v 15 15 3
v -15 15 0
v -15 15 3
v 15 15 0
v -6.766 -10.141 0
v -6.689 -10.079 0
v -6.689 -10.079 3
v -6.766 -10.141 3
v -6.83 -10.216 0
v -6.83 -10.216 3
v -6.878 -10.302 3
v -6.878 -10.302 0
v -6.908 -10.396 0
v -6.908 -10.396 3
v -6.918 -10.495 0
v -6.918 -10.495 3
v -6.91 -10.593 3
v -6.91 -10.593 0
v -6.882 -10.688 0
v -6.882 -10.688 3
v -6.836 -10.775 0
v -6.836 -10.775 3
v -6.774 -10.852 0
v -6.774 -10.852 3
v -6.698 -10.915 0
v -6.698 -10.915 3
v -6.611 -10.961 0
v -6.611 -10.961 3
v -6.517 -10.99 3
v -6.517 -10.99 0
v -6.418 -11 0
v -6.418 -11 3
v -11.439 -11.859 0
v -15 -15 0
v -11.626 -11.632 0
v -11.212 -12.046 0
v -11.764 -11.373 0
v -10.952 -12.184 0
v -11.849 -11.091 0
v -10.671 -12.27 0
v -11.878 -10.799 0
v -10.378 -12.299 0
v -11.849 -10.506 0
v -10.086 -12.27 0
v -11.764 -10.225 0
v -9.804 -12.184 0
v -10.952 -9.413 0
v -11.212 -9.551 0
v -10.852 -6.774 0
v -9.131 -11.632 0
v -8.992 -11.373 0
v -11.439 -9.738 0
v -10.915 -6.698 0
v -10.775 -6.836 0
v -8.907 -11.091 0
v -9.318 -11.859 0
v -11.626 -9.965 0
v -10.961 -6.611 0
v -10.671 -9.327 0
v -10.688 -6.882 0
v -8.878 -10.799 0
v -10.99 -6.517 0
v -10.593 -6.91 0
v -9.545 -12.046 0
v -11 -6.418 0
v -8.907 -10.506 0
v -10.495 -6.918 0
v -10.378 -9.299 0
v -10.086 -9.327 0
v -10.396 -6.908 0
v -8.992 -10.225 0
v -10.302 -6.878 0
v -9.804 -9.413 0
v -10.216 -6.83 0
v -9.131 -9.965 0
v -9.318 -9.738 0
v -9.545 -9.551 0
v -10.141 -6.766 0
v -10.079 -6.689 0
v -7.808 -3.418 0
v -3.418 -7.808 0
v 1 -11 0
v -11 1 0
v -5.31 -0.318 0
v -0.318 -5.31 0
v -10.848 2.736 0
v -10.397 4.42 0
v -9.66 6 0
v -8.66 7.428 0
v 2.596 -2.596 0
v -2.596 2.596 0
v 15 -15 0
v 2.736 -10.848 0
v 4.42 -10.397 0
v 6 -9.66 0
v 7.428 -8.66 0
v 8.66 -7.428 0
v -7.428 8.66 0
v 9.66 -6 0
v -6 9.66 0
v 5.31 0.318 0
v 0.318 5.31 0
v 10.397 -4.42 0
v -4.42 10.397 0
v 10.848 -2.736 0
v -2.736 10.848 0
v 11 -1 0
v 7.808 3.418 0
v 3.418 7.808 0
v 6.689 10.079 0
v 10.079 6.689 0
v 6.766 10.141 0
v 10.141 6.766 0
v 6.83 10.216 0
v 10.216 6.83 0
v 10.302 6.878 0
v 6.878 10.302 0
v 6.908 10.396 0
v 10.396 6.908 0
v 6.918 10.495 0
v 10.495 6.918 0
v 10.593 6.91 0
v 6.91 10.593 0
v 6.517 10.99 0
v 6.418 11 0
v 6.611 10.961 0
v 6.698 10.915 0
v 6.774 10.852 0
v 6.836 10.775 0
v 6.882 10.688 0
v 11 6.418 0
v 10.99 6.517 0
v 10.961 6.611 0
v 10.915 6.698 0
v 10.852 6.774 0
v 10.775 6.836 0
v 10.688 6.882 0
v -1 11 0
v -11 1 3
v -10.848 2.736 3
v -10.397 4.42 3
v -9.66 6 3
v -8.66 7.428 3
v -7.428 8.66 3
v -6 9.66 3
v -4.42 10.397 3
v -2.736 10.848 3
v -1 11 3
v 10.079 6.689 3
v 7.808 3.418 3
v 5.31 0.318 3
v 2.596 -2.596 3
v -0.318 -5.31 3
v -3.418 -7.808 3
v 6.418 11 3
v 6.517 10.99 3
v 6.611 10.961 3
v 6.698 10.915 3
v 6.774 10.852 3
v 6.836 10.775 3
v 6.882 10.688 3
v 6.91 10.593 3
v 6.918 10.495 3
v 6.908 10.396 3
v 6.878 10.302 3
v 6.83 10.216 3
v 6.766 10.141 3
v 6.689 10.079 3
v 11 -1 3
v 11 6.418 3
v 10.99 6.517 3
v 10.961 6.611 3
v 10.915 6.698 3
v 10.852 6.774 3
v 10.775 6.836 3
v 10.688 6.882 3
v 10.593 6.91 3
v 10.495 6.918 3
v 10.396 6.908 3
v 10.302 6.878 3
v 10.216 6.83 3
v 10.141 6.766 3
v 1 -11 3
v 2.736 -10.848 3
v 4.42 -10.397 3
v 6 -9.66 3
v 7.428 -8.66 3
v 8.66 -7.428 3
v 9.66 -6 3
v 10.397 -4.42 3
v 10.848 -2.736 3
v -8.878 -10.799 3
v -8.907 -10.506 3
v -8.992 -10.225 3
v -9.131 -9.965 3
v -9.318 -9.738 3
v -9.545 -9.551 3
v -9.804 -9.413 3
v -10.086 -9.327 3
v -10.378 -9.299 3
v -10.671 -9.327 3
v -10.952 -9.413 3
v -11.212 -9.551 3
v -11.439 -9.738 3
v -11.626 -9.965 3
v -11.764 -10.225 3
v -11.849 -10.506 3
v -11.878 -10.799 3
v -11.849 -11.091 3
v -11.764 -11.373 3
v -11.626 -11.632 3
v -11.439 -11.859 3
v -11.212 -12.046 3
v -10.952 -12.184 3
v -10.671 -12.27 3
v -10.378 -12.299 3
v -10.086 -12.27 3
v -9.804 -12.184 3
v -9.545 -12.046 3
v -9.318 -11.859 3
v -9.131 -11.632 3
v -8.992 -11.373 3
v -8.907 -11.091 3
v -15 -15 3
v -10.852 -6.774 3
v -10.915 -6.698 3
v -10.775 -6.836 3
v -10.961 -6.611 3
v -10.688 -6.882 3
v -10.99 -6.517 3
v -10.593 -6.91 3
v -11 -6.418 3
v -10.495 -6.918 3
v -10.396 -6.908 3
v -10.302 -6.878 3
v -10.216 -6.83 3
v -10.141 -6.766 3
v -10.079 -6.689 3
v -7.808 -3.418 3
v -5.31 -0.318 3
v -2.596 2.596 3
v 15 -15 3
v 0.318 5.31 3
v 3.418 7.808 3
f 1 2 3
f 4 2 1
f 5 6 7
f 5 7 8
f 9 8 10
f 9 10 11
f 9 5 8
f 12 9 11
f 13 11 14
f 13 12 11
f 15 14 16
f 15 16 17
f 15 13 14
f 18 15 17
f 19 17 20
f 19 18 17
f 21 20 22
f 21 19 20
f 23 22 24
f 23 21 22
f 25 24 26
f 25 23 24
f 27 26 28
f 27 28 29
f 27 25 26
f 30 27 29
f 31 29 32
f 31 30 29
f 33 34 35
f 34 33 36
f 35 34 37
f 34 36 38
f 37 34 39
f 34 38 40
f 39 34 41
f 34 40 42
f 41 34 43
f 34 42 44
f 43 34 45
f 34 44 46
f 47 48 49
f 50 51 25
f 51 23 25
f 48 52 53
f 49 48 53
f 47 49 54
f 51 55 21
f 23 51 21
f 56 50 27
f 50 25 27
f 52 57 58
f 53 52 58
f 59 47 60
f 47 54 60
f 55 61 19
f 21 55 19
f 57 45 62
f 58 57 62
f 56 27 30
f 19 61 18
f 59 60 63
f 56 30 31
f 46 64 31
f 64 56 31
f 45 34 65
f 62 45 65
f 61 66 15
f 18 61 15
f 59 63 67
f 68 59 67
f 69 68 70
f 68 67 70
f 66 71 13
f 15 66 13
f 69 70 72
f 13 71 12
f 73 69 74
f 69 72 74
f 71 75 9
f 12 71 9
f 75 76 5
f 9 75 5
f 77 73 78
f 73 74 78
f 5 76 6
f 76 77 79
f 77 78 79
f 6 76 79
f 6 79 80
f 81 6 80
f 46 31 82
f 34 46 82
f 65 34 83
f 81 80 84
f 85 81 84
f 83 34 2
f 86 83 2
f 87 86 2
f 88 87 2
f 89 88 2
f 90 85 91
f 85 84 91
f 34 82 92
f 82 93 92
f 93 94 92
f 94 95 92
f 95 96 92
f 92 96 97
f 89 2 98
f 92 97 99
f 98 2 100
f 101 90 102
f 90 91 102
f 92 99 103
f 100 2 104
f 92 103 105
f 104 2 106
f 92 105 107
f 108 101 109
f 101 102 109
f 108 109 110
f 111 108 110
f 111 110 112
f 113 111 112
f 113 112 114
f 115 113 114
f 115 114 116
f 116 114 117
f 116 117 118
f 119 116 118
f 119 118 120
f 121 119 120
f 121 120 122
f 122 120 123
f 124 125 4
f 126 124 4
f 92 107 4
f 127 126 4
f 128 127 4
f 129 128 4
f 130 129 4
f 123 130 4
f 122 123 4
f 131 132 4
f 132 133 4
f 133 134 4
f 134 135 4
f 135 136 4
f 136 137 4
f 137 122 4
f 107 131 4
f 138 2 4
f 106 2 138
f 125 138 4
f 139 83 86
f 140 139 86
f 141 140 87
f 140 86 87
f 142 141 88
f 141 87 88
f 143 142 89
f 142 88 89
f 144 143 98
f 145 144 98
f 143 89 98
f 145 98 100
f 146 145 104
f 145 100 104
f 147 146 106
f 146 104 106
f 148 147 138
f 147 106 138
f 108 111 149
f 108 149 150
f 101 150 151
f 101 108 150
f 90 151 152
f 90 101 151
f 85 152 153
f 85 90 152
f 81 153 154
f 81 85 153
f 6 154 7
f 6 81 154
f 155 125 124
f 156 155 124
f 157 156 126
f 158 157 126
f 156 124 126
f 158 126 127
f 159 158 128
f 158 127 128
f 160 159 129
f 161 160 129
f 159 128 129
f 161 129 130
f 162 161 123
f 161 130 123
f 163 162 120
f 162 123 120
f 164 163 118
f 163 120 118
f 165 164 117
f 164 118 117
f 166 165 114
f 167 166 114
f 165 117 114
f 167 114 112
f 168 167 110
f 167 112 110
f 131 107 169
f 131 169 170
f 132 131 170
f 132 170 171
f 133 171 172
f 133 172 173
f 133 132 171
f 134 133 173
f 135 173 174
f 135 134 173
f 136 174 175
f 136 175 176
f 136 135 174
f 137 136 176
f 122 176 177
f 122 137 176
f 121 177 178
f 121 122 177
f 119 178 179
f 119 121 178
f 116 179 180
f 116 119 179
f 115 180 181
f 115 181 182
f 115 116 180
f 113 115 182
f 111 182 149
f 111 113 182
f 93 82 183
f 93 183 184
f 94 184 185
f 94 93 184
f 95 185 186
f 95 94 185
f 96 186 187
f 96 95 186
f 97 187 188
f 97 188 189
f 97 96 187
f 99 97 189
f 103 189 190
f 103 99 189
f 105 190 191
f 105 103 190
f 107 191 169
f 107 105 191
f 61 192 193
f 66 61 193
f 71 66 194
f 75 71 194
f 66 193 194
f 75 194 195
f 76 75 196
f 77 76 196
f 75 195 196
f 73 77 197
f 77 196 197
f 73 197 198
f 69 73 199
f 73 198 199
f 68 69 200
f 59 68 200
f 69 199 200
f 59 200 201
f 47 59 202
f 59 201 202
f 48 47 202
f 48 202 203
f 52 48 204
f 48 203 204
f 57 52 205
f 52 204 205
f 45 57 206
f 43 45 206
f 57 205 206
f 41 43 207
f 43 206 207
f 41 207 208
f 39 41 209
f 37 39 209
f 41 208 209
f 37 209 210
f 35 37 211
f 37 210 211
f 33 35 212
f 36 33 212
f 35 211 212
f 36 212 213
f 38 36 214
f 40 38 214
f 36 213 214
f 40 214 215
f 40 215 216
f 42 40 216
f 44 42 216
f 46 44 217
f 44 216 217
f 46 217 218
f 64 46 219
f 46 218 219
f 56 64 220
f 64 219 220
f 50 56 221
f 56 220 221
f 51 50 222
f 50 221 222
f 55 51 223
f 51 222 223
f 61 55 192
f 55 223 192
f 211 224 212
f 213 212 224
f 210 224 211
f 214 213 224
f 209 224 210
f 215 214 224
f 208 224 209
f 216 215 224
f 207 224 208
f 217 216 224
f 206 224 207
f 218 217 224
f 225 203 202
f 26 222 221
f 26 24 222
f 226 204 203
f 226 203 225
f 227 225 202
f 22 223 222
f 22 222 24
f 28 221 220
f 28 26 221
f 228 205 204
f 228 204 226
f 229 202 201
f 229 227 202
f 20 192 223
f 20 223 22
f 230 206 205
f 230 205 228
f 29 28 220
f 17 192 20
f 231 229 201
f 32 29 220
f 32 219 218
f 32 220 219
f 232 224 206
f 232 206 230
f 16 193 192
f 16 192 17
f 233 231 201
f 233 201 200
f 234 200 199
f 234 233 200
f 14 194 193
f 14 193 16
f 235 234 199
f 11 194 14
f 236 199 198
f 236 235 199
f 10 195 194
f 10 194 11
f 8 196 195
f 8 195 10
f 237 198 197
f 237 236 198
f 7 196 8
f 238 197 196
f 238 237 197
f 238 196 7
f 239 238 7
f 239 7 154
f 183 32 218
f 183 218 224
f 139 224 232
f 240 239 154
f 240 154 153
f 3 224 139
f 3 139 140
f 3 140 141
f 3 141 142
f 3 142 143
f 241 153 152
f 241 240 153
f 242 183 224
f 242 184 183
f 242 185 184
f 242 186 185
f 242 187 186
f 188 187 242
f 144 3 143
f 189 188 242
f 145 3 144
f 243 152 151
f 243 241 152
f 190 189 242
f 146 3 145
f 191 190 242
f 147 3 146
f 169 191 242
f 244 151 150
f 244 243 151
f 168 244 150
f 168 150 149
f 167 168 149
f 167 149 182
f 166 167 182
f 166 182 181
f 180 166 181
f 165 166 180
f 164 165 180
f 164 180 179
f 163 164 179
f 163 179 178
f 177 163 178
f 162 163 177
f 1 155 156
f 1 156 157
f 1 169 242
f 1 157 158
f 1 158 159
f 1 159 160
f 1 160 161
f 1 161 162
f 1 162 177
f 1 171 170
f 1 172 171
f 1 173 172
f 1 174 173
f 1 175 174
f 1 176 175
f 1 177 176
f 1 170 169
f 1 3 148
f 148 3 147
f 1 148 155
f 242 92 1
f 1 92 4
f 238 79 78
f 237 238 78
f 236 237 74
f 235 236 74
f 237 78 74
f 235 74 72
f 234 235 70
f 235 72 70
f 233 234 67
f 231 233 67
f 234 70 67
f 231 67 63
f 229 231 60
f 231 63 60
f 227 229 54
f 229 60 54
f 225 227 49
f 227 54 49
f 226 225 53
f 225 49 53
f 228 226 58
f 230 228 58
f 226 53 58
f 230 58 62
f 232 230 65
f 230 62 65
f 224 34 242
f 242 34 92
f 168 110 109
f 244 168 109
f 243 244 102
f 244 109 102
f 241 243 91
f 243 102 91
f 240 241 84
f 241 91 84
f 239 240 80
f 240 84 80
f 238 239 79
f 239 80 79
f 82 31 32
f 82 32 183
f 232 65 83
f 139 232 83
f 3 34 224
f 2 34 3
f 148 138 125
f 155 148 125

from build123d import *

# Parameters (mm, degrees)
CROQUIS1_W              = 30
CROQUIS1_H              = 30
SALIENTE_EXTRUIR1_DEPTH = 3
CROQUIS2_R              = 1.5
CORTAR_EXTRUIR1_DEPTH   = 3


with BuildPart() as part:
    # Croquis1 → Saliente-Extruir1 (new body)
    with BuildSketch(Plane.XY):
        Rectangle(CROQUIS1_W, CROQUIS1_H)
        with BuildLine():
            Line((-6.418498959, -11), (1, -11))
            ThreePointArc((1, -11), (8.071067812, -8.071067812), (11, -1))
            Line((11, -1), (11, 6.418498959))
            ThreePointArc((11, 6.418498959), (10.640885104, 6.898239917), (10.07939445, 6.688852377))
            ThreePointArc((10.07939445, 6.688852377), (2.596324807, -2.596324807), (-6.688852377, -10.07939445))
            ThreePointArc((-6.688852377, -10.07939445), (-6.898239917, -10.640885104), (-6.418498959, -11))
        make_face(mode=Mode.SUBTRACT)
        with BuildLine():
            Line((-11, -6.418498959), (-11, 1))
            ThreePointArc((-11, 1), (-8.071067812, 8.071067812), (-1, 11))
            Line((-1, 11), (6.418498959, 11))
            ThreePointArc((6.418498959, 11), (6.898239917, 10.640885104), (6.688852377, 10.07939445))
            ThreePointArc((6.688852377, 10.07939445), (-2.596324807, 2.596324807), (-10.07939445, -6.688852377))
            ThreePointArc((-10.07939445, -6.688852377), (-10.640885104, -6.898239917), (-11, -6.418498959))
        make_face(mode=Mode.SUBTRACT)
    extrude(amount=SALIENTE_EXTRUIR1_DEPTH)

    # Croquis2 → Cortar-Extruir1 (cut)
    with BuildSketch(Plane.XY.offset(3)):
        with Locations((-10.378302419, -10.798607502)):
            Circle(CROQUIS2_R)
    extrude(amount=-CORTAR_EXTRUIR1_DEPTH, mode=Mode.SUBTRACT)


solid = part.part
